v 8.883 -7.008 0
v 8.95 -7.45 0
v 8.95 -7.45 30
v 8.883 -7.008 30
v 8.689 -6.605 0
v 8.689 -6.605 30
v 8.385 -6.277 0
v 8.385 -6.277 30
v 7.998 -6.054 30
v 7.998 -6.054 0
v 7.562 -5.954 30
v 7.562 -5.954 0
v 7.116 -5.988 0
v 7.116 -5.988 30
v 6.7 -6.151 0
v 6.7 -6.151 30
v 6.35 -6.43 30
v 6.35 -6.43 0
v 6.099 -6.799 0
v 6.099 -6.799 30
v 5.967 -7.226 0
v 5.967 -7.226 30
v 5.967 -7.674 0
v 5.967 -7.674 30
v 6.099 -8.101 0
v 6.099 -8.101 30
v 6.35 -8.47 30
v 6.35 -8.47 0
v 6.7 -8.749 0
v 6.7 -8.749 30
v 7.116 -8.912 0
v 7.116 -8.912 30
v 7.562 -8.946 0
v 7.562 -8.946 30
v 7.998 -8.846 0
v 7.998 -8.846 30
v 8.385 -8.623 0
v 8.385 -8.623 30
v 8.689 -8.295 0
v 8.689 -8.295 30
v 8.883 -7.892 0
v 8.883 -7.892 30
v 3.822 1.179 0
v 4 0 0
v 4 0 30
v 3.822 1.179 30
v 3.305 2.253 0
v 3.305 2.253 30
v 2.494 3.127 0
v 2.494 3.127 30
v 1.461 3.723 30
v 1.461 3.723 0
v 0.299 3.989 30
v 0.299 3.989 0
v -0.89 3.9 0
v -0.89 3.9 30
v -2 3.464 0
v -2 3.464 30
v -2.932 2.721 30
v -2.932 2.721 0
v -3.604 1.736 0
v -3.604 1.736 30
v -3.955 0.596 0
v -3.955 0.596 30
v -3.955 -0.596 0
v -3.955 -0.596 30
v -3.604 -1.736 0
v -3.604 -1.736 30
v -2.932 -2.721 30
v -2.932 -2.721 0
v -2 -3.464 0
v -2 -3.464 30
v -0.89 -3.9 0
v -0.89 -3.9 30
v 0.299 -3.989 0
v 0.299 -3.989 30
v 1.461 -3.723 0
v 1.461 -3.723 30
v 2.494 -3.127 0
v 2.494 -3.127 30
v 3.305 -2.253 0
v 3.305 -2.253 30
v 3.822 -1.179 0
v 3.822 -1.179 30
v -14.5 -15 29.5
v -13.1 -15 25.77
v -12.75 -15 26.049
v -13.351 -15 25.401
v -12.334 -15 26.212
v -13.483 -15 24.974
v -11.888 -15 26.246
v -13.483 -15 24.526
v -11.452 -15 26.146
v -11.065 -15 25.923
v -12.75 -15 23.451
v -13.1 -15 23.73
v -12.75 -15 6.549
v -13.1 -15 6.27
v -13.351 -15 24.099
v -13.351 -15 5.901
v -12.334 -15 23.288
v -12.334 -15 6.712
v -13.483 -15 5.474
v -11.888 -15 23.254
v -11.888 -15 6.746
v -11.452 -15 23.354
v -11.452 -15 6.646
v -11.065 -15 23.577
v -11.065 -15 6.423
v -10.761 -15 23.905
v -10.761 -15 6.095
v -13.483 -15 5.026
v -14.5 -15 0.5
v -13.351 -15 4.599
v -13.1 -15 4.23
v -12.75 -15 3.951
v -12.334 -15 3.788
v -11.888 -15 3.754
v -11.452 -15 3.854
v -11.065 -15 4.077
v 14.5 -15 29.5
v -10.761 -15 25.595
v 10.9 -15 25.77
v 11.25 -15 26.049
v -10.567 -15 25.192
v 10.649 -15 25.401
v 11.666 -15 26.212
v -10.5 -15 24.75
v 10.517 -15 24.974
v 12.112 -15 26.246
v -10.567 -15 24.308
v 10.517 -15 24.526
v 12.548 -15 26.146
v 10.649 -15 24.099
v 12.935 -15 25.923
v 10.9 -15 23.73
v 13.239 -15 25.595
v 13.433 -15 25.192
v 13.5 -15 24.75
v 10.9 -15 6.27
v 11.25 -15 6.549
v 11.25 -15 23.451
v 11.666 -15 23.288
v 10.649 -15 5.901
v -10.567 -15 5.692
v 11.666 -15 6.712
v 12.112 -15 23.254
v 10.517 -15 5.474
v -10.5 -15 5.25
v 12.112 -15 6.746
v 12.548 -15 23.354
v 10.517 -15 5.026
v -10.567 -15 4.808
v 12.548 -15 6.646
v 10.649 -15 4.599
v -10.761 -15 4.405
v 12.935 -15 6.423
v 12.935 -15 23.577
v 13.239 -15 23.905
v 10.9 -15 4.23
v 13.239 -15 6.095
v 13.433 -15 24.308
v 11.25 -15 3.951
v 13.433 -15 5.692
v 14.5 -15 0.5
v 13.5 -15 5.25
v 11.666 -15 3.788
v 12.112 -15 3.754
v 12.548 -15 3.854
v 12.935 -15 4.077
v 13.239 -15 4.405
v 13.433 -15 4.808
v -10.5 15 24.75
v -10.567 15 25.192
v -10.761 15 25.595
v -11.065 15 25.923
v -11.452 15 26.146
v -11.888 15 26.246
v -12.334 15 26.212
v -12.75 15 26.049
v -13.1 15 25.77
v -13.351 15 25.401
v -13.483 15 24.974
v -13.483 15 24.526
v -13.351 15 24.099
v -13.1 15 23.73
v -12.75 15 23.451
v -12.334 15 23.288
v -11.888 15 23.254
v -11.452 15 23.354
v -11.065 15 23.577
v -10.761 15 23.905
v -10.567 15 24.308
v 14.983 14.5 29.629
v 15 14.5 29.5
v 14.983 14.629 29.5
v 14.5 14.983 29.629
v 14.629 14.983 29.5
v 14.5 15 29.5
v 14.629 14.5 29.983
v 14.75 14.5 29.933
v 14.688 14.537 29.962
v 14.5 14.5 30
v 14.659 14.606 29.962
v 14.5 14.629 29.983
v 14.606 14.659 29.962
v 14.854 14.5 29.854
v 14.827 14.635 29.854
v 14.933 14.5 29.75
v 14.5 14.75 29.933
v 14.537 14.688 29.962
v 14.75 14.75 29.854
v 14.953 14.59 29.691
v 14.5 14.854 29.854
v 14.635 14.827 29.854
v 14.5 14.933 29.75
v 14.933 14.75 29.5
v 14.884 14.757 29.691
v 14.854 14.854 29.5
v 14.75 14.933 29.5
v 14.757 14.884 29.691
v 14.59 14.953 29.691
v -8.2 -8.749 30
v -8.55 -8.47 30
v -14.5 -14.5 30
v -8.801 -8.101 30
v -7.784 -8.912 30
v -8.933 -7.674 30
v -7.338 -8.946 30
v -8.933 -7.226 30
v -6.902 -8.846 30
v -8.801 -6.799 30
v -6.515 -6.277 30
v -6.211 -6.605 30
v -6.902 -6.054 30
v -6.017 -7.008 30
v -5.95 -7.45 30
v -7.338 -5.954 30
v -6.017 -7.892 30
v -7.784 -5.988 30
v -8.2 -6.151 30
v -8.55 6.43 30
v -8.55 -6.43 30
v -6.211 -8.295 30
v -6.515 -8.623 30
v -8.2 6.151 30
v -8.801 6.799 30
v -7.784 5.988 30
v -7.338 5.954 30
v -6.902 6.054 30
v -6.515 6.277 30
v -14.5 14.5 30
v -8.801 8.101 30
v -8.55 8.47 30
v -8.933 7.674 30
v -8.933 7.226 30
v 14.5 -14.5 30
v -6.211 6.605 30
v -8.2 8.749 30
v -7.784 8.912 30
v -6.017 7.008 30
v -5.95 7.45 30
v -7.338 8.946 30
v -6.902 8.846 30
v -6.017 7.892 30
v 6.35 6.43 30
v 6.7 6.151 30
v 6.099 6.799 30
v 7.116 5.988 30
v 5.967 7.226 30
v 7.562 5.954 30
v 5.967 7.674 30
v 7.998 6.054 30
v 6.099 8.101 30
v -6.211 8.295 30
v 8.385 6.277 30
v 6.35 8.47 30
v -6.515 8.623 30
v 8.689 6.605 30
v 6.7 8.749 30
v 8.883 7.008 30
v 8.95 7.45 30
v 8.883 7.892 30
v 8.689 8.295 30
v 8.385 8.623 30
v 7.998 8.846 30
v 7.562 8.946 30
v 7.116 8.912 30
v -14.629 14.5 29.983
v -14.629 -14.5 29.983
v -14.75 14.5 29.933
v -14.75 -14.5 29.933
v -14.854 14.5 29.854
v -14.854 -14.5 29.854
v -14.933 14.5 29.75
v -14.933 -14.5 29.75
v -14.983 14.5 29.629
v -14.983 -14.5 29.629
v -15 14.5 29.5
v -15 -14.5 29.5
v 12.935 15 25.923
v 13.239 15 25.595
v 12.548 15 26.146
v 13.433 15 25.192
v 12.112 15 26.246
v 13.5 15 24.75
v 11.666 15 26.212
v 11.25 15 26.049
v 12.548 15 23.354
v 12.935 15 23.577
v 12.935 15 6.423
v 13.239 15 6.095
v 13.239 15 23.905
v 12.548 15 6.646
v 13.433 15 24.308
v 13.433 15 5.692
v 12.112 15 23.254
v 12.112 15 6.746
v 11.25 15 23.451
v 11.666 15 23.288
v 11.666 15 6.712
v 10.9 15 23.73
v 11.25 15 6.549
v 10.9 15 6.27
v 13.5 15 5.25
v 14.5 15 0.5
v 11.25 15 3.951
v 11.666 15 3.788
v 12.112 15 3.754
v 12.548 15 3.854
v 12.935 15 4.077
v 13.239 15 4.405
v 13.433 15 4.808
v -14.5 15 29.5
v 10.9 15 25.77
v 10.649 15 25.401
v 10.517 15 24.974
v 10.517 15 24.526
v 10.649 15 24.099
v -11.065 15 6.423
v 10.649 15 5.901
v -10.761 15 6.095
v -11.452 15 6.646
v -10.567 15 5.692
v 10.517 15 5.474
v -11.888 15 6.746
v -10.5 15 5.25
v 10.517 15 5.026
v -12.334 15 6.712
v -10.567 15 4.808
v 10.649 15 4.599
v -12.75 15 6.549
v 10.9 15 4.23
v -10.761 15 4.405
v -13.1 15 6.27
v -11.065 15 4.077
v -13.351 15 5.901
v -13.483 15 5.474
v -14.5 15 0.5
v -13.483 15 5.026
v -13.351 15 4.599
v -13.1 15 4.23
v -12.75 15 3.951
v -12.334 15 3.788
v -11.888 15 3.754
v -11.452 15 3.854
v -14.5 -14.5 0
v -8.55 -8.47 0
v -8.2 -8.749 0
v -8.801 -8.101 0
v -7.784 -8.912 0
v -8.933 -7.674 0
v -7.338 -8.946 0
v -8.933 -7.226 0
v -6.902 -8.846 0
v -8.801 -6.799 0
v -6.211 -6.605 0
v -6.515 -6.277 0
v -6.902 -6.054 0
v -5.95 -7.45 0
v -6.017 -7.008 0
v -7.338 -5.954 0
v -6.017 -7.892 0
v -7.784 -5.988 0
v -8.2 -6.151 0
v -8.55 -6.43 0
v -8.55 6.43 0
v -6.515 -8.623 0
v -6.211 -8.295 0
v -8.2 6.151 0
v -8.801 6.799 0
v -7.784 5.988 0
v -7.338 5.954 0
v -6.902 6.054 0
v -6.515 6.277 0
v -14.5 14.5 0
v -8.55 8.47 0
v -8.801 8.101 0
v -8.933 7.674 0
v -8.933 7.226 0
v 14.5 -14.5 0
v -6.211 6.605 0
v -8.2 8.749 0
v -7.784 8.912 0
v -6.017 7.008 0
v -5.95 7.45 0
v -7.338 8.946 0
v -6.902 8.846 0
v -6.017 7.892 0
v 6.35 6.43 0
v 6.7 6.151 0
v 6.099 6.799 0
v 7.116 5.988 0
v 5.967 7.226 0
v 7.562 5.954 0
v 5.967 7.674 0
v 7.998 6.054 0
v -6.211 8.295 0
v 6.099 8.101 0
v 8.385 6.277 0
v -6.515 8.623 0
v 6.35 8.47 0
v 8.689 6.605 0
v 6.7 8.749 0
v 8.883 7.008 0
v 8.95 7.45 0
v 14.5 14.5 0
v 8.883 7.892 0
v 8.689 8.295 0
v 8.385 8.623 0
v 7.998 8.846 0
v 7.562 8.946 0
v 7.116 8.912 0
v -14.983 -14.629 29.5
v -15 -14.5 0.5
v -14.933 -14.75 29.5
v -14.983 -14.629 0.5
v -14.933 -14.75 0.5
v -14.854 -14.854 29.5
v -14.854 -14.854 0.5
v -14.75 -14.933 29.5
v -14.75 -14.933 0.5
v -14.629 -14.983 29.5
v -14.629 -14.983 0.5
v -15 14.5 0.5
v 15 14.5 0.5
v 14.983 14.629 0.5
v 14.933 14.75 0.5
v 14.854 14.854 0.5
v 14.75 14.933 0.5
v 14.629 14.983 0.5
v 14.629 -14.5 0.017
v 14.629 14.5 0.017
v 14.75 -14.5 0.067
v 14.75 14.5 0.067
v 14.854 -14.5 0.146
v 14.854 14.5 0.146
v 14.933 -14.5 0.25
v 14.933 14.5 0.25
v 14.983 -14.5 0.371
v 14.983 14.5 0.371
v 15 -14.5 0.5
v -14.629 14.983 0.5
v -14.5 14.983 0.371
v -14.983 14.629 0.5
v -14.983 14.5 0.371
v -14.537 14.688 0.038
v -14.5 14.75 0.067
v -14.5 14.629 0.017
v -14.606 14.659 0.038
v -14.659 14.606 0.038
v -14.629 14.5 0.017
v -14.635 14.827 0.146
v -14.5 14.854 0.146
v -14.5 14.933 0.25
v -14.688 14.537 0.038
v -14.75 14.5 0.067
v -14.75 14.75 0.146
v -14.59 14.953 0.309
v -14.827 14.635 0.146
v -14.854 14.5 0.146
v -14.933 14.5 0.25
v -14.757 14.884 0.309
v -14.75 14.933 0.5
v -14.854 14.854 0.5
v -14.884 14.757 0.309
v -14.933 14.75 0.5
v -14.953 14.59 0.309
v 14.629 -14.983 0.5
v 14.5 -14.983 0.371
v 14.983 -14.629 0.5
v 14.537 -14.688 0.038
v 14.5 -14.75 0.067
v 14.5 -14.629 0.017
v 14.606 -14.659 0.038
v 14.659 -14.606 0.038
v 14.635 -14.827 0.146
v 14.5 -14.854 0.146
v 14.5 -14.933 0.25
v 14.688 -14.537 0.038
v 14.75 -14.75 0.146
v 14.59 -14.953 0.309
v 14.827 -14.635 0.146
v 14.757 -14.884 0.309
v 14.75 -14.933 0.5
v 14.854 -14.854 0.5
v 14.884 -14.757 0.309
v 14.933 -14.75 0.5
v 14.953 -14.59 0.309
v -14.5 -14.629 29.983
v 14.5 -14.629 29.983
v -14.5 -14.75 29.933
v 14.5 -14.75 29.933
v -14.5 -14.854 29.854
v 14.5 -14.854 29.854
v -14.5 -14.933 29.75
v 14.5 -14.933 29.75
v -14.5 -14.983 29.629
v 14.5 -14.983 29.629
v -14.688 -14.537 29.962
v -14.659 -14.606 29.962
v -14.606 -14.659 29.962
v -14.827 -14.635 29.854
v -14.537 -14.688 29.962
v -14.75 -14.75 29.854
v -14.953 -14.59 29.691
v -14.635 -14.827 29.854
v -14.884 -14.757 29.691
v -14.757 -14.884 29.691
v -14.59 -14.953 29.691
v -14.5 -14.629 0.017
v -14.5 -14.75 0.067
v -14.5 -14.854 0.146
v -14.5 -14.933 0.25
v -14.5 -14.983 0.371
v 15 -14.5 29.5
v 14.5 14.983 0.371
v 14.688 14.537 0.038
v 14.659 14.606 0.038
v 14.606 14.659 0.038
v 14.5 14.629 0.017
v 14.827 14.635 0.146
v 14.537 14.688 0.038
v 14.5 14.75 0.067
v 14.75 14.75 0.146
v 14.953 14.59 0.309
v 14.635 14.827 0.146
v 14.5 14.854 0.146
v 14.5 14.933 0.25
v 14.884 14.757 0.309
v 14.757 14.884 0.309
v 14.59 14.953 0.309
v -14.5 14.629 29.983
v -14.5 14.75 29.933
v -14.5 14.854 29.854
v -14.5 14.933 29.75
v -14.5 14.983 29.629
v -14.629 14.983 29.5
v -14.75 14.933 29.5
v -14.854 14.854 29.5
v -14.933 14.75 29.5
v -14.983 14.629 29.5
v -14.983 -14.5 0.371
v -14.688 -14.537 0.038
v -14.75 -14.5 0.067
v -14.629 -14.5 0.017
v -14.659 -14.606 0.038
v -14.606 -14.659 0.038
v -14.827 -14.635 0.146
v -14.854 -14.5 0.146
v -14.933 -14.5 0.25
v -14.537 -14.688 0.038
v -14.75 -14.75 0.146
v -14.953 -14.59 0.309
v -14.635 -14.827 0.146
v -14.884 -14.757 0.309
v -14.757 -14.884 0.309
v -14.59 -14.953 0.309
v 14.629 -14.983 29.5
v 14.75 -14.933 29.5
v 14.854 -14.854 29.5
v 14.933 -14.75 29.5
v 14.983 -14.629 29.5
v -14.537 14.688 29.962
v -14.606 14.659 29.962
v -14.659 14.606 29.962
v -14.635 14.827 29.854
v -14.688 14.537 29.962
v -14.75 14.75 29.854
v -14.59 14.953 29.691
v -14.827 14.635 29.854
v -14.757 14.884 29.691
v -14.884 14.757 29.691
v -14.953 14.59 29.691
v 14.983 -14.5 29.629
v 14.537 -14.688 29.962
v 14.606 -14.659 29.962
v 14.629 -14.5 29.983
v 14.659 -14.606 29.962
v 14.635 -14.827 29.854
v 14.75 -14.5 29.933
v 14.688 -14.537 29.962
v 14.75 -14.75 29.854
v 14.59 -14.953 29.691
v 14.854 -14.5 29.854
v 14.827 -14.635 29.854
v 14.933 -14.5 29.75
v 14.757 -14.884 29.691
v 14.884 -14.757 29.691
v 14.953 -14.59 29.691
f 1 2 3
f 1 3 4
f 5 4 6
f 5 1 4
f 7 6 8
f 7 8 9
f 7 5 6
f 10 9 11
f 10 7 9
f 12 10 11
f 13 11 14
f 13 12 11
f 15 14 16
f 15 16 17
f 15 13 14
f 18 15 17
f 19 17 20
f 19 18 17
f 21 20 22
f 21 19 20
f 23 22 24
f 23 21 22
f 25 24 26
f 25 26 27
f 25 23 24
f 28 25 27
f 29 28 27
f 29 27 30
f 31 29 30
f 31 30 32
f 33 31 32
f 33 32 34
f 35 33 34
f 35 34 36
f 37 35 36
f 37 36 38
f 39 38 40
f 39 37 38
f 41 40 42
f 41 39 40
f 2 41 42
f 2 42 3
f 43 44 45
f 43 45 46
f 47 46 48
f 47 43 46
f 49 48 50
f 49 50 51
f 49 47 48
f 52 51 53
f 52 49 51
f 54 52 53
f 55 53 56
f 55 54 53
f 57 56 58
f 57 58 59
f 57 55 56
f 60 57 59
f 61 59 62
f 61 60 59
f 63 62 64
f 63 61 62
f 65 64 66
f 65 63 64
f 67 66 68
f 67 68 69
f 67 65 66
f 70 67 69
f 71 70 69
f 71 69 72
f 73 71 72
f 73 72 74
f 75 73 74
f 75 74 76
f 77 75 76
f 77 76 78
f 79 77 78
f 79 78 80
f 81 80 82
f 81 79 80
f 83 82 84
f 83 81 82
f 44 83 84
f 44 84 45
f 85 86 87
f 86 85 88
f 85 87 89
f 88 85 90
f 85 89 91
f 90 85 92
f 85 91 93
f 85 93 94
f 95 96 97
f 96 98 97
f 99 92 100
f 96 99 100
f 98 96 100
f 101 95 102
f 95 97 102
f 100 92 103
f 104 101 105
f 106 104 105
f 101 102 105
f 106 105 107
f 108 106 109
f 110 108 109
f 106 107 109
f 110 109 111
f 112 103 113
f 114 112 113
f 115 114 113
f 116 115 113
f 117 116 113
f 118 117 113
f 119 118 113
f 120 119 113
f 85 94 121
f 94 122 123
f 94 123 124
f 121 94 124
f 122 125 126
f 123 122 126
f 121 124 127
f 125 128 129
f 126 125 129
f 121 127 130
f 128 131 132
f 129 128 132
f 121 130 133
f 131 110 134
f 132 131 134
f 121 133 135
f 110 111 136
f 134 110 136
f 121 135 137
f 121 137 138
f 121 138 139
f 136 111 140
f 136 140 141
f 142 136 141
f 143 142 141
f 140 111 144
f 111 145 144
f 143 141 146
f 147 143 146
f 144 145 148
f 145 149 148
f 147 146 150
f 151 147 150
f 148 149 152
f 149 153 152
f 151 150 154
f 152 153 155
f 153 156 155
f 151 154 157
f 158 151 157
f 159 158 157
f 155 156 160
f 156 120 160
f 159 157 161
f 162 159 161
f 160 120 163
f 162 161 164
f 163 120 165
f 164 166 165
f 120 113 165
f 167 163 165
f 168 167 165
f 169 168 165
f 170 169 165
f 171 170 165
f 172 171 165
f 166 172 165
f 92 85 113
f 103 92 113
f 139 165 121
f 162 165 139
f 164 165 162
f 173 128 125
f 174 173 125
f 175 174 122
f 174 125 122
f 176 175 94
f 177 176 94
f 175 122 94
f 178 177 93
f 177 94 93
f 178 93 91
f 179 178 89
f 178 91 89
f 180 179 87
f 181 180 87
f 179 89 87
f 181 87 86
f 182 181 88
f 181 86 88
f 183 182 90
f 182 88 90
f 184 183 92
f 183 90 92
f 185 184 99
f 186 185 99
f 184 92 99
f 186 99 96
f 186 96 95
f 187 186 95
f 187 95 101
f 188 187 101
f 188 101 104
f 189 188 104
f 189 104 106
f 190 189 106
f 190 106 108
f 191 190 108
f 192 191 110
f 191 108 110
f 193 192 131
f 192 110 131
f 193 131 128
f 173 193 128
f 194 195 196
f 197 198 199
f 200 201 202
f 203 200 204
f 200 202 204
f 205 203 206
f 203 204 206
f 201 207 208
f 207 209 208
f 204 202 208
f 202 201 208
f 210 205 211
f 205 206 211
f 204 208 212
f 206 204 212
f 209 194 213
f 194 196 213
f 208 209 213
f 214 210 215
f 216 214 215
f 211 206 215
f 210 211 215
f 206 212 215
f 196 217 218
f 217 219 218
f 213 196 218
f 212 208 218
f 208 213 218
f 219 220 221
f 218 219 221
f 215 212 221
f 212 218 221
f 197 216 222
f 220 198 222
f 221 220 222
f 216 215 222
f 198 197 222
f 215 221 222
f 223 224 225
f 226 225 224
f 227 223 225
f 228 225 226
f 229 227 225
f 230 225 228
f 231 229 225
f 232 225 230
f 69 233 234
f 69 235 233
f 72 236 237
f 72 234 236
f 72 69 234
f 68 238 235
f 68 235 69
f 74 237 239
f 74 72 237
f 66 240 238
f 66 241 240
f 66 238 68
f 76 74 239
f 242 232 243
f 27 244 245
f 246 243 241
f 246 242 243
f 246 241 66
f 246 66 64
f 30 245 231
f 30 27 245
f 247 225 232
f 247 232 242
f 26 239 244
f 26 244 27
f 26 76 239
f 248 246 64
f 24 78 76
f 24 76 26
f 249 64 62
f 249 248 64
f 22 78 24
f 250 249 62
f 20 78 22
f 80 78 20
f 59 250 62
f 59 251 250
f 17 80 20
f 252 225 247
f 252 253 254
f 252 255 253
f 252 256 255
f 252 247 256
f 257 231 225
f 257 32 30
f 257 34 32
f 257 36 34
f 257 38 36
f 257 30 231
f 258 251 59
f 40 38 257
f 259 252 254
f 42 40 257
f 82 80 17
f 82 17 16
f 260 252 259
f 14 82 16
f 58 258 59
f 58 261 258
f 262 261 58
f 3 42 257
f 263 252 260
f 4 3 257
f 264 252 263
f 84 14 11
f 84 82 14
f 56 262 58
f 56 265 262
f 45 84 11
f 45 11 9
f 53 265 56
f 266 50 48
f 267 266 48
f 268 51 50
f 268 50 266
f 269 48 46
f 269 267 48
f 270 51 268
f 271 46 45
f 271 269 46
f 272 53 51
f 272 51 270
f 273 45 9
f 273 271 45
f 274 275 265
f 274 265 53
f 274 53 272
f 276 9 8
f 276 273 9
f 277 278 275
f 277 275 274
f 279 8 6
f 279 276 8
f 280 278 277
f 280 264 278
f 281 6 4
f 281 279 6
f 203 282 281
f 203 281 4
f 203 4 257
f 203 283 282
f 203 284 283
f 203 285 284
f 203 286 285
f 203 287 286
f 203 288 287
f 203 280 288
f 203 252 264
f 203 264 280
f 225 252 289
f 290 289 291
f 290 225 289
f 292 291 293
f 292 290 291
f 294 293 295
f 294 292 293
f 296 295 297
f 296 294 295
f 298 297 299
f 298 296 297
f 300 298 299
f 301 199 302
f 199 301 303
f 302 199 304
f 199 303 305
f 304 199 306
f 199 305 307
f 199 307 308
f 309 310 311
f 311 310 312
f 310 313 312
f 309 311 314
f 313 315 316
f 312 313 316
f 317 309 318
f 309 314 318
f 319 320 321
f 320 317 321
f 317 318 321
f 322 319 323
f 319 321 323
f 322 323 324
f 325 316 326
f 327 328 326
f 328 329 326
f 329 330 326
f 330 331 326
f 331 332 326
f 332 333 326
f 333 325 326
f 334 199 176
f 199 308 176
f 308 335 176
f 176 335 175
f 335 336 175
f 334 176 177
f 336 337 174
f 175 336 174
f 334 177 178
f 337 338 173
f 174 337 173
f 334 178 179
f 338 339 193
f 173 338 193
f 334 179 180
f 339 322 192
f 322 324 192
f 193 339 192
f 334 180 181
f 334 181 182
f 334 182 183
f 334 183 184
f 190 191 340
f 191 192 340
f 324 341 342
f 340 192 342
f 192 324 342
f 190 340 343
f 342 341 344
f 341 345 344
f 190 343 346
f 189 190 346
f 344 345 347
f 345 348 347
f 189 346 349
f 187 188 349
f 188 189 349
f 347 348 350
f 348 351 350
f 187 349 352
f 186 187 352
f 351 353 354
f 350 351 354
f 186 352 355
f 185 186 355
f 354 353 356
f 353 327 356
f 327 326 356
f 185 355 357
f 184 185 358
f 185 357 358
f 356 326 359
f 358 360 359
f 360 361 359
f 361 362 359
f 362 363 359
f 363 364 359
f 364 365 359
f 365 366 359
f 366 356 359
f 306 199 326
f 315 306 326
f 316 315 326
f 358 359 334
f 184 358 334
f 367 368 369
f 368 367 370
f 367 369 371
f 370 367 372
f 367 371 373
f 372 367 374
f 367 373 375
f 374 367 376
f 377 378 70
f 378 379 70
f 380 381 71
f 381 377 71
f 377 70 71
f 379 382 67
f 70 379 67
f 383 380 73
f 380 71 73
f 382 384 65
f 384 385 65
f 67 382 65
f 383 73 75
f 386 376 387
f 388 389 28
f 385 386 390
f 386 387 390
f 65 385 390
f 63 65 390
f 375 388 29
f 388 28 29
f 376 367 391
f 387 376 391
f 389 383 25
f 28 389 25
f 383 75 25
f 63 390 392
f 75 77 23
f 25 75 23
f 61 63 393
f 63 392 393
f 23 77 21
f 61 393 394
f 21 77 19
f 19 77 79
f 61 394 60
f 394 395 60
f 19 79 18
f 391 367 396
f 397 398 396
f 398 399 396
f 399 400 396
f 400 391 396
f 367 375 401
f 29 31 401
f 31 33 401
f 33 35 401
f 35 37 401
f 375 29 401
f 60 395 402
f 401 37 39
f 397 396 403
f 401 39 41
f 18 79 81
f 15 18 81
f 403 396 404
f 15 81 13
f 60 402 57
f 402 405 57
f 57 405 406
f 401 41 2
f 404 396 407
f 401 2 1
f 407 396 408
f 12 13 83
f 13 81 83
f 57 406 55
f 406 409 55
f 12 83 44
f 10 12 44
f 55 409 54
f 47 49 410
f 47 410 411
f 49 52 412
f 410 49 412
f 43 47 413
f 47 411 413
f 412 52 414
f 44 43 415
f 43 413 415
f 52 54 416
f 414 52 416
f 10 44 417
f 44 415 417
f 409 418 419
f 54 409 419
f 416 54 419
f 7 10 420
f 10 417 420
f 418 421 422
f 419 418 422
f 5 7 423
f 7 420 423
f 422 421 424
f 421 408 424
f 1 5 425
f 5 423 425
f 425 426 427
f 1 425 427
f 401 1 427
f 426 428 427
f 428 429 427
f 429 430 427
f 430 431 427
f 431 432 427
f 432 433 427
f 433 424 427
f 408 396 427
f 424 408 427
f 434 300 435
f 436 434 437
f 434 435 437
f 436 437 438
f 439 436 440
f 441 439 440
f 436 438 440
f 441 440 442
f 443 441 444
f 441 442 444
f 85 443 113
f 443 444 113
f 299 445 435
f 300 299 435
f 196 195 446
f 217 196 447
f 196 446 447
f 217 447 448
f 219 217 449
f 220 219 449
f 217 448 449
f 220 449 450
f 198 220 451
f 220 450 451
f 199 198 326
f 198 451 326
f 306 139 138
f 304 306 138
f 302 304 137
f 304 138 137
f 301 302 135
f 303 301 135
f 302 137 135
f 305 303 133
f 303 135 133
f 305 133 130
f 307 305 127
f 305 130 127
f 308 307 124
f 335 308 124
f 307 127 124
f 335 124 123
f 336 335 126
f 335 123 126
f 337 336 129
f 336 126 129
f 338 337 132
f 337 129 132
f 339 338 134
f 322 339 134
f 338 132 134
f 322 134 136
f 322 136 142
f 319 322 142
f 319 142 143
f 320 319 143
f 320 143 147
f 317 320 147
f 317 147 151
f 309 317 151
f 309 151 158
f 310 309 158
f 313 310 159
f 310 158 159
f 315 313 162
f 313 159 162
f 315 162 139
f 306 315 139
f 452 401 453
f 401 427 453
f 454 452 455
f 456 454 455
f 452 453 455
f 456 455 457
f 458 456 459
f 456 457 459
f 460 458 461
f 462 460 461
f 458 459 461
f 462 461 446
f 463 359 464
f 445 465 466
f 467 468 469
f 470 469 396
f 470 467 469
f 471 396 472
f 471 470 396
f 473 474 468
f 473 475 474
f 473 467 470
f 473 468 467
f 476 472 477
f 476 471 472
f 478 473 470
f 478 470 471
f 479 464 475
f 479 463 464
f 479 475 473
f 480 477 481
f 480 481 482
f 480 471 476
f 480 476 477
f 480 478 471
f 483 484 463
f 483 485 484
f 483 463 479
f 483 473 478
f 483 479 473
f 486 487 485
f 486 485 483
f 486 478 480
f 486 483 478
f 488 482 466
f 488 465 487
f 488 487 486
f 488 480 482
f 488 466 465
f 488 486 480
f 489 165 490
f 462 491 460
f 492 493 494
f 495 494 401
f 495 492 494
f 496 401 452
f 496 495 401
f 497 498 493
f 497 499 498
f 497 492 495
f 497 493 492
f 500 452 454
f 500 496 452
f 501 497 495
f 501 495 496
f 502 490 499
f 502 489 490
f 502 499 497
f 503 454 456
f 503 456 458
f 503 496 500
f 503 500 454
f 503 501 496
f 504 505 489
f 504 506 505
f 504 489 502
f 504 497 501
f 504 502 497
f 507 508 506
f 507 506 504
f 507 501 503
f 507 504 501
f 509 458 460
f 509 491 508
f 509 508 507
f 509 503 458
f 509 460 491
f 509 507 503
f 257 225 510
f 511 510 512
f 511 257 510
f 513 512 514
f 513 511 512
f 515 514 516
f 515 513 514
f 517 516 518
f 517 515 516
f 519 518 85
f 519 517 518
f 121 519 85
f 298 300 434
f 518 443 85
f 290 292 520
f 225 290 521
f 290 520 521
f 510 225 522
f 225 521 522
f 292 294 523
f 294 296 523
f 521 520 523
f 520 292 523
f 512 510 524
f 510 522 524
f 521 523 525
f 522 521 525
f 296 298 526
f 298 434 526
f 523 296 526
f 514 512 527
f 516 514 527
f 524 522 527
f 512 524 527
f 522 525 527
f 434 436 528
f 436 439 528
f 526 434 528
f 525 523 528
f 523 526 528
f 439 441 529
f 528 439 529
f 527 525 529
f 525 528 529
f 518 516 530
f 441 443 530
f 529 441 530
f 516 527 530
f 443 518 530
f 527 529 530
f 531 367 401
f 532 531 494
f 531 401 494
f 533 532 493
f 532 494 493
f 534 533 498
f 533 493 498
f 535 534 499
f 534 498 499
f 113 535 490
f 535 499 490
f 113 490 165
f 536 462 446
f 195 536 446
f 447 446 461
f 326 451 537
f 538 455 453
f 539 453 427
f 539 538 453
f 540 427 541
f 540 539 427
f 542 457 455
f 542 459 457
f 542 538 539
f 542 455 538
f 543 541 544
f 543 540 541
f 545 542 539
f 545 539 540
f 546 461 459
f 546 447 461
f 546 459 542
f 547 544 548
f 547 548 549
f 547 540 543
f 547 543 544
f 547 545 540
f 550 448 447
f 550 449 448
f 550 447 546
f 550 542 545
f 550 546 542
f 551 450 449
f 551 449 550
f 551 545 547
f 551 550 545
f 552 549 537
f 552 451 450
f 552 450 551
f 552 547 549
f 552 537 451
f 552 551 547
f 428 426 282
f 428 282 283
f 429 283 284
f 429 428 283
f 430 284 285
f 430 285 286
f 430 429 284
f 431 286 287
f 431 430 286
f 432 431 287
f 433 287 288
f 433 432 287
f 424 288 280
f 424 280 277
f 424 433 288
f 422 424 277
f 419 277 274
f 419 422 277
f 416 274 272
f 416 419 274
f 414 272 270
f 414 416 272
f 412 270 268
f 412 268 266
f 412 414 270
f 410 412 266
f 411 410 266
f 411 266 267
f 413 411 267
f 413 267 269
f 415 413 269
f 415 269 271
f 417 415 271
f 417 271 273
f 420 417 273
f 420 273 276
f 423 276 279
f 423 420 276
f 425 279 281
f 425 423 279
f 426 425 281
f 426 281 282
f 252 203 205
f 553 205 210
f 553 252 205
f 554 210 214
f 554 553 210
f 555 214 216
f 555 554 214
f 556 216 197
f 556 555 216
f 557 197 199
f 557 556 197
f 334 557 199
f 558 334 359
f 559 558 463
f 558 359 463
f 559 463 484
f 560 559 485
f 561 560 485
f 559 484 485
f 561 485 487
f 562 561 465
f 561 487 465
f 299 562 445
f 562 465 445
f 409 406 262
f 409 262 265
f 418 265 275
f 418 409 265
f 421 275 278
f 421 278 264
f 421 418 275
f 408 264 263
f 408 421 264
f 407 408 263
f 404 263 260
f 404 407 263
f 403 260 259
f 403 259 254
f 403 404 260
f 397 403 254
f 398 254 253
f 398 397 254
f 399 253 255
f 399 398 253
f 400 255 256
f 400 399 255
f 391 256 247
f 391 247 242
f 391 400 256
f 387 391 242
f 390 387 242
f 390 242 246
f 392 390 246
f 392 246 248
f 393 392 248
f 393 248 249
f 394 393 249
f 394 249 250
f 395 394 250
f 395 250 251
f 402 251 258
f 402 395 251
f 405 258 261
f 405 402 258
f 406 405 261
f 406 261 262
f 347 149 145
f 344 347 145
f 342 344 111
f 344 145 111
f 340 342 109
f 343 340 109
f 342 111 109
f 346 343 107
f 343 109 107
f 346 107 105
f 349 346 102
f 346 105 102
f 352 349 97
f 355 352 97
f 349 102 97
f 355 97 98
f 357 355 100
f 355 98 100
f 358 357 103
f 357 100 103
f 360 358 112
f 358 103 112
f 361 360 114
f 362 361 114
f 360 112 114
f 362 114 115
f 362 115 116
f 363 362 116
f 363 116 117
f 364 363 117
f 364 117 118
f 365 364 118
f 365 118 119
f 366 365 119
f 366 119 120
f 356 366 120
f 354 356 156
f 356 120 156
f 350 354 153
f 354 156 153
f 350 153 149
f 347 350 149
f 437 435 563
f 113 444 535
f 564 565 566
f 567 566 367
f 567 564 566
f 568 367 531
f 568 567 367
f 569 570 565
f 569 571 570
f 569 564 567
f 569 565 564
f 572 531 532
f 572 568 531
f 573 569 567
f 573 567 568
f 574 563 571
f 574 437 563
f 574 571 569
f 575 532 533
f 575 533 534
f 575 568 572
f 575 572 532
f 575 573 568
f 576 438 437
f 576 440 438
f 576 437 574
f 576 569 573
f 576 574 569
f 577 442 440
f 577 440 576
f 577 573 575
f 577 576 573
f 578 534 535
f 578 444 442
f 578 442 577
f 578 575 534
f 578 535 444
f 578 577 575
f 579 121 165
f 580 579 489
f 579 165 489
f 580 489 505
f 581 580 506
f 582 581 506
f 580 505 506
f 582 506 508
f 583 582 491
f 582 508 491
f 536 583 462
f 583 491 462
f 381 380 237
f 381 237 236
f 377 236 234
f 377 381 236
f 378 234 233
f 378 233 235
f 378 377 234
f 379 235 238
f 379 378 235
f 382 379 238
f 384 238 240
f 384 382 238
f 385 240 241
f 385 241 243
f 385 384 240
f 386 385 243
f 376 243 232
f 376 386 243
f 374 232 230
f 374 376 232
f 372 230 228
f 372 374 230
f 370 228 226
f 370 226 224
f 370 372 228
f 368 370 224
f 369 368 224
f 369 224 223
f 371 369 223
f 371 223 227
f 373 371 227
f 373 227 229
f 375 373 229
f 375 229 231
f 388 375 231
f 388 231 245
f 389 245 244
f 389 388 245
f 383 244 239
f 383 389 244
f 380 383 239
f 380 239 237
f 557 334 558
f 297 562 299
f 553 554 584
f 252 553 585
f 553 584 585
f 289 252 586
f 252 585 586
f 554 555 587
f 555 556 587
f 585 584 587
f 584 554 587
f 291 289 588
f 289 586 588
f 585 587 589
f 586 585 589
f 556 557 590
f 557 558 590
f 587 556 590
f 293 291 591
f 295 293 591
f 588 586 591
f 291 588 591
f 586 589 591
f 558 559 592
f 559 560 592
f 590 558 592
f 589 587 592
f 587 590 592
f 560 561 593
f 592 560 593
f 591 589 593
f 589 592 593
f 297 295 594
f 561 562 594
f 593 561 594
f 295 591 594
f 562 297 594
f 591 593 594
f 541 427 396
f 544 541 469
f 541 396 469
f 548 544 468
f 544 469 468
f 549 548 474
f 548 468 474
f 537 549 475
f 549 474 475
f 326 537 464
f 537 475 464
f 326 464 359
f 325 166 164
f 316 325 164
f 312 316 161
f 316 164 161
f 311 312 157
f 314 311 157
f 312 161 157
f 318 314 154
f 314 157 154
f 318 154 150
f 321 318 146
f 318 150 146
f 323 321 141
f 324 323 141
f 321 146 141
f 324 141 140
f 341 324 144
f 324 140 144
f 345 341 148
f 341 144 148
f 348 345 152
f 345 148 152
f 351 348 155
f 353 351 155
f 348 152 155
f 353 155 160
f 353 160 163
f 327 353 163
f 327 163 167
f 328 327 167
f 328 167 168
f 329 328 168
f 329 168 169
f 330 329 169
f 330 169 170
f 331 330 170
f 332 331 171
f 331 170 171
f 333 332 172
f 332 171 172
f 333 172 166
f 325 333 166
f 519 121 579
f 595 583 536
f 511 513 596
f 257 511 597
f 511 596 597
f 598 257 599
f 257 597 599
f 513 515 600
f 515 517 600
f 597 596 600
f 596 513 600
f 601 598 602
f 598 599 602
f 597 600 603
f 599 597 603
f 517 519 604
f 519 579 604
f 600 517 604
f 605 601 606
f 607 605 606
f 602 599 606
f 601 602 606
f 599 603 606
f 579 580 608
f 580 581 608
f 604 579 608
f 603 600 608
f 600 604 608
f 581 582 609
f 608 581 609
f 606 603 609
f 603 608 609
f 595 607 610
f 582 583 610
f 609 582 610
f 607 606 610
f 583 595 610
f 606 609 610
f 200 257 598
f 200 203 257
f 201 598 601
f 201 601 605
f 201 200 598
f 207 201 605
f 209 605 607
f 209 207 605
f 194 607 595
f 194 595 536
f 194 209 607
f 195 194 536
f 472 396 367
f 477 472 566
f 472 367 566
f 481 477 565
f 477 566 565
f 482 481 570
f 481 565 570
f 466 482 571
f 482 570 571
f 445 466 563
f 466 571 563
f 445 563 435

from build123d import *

# Parameters (mm, degrees)
CROQUIS1_R              = 4
CROQUIS1_R_2            = 1.5
SALIENTE_EXTRUIR1_DEPTH = 30
CROQUIS2_R              = 1.5
CORTAR_EXTRUIR1_DEPTH   = 30
REDONDEO1_R             = 0.5
REDONDEO2_R             = 0.5


with BuildPart() as part:
    # Croquis1 → Saliente-Extruir1 (new body)
    with BuildSketch(Plane.XY):
        with BuildLine():
            Line((-14.5, -15), (14.5, -15))
            ThreePointArc((14.5, -15), (14.853553391, -14.853553391), (15, -14.5))
            Line((15, -14.5), (15, 14.5))
            ThreePointArc((15, 14.5), (14.853553391, 14.853553391), (14.5, 15))
            Line((14.5, 15), (-14.5, 15))
            ThreePointArc((-14.5, 15), (-14.853553391, 14.853553391), (-15, 14.5))
            Line((-15, 14.5), (-15, -14.5))
            ThreePointArc((-15, -14.5), (-14.853553391, -14.853553391), (-14.5, -15))
        make_face()
        Circle(CROQUIS1_R, mode=Mode.SUBTRACT)
        with Locations((-7.45, 7.45)):
            Circle(CROQUIS1_R_2, mode=Mode.SUBTRACT)
        with Locations((7.45, 7.45)):
            Circle(CROQUIS1_R_2, mode=Mode.SUBTRACT)
        with Locations((-7.45, -7.45)):
            Circle(CROQUIS1_R_2, mode=Mode.SUBTRACT)
        with Locations((7.45, -7.45)):
            Circle(CROQUIS1_R_2, mode=Mode.SUBTRACT)
    extrude(amount=SALIENTE_EXTRUIR1_DEPTH)

    # Croquis2 → Cortar-Extruir1 (cut)
    with BuildSketch(Plane.XZ.offset(15)):
        with Locations((-12, 24.75)):
            Circle(CROQUIS2_R)
        with Locations((12, 24.75)):
            Circle(CROQUIS2_R)
        with Locations((12, 5.25)):
            Circle(CROQUIS2_R)
        with Locations((-12, 5.25)):
            Circle(CROQUIS2_R)
    extrude(amount=-CORTAR_EXTRUIR1_DEPTH, mode=Mode.SUBTRACT)

    # Redondeo1
    redondeo1_edges = [part.edges().sort_by_distance(p)[0] for p in [
        (15, 0, 30),
        (0, 15, 30),
        (-15, 0, 30),
        (0, -15, 30),
    ]]
    fillet(redondeo1_edges, radius=REDONDEO1_R)

    # Redondeo2
    redondeo2_edges = [part.edges().sort_by_distance(p)[0] for p in [
        (15, 0, 0),
        (0, -15, 0),
        (-15, 0, 0),
        (0, 15, 0),
    ]]
    fillet(redondeo2_edges, radius=REDONDEO2_R)


solid = part.part
